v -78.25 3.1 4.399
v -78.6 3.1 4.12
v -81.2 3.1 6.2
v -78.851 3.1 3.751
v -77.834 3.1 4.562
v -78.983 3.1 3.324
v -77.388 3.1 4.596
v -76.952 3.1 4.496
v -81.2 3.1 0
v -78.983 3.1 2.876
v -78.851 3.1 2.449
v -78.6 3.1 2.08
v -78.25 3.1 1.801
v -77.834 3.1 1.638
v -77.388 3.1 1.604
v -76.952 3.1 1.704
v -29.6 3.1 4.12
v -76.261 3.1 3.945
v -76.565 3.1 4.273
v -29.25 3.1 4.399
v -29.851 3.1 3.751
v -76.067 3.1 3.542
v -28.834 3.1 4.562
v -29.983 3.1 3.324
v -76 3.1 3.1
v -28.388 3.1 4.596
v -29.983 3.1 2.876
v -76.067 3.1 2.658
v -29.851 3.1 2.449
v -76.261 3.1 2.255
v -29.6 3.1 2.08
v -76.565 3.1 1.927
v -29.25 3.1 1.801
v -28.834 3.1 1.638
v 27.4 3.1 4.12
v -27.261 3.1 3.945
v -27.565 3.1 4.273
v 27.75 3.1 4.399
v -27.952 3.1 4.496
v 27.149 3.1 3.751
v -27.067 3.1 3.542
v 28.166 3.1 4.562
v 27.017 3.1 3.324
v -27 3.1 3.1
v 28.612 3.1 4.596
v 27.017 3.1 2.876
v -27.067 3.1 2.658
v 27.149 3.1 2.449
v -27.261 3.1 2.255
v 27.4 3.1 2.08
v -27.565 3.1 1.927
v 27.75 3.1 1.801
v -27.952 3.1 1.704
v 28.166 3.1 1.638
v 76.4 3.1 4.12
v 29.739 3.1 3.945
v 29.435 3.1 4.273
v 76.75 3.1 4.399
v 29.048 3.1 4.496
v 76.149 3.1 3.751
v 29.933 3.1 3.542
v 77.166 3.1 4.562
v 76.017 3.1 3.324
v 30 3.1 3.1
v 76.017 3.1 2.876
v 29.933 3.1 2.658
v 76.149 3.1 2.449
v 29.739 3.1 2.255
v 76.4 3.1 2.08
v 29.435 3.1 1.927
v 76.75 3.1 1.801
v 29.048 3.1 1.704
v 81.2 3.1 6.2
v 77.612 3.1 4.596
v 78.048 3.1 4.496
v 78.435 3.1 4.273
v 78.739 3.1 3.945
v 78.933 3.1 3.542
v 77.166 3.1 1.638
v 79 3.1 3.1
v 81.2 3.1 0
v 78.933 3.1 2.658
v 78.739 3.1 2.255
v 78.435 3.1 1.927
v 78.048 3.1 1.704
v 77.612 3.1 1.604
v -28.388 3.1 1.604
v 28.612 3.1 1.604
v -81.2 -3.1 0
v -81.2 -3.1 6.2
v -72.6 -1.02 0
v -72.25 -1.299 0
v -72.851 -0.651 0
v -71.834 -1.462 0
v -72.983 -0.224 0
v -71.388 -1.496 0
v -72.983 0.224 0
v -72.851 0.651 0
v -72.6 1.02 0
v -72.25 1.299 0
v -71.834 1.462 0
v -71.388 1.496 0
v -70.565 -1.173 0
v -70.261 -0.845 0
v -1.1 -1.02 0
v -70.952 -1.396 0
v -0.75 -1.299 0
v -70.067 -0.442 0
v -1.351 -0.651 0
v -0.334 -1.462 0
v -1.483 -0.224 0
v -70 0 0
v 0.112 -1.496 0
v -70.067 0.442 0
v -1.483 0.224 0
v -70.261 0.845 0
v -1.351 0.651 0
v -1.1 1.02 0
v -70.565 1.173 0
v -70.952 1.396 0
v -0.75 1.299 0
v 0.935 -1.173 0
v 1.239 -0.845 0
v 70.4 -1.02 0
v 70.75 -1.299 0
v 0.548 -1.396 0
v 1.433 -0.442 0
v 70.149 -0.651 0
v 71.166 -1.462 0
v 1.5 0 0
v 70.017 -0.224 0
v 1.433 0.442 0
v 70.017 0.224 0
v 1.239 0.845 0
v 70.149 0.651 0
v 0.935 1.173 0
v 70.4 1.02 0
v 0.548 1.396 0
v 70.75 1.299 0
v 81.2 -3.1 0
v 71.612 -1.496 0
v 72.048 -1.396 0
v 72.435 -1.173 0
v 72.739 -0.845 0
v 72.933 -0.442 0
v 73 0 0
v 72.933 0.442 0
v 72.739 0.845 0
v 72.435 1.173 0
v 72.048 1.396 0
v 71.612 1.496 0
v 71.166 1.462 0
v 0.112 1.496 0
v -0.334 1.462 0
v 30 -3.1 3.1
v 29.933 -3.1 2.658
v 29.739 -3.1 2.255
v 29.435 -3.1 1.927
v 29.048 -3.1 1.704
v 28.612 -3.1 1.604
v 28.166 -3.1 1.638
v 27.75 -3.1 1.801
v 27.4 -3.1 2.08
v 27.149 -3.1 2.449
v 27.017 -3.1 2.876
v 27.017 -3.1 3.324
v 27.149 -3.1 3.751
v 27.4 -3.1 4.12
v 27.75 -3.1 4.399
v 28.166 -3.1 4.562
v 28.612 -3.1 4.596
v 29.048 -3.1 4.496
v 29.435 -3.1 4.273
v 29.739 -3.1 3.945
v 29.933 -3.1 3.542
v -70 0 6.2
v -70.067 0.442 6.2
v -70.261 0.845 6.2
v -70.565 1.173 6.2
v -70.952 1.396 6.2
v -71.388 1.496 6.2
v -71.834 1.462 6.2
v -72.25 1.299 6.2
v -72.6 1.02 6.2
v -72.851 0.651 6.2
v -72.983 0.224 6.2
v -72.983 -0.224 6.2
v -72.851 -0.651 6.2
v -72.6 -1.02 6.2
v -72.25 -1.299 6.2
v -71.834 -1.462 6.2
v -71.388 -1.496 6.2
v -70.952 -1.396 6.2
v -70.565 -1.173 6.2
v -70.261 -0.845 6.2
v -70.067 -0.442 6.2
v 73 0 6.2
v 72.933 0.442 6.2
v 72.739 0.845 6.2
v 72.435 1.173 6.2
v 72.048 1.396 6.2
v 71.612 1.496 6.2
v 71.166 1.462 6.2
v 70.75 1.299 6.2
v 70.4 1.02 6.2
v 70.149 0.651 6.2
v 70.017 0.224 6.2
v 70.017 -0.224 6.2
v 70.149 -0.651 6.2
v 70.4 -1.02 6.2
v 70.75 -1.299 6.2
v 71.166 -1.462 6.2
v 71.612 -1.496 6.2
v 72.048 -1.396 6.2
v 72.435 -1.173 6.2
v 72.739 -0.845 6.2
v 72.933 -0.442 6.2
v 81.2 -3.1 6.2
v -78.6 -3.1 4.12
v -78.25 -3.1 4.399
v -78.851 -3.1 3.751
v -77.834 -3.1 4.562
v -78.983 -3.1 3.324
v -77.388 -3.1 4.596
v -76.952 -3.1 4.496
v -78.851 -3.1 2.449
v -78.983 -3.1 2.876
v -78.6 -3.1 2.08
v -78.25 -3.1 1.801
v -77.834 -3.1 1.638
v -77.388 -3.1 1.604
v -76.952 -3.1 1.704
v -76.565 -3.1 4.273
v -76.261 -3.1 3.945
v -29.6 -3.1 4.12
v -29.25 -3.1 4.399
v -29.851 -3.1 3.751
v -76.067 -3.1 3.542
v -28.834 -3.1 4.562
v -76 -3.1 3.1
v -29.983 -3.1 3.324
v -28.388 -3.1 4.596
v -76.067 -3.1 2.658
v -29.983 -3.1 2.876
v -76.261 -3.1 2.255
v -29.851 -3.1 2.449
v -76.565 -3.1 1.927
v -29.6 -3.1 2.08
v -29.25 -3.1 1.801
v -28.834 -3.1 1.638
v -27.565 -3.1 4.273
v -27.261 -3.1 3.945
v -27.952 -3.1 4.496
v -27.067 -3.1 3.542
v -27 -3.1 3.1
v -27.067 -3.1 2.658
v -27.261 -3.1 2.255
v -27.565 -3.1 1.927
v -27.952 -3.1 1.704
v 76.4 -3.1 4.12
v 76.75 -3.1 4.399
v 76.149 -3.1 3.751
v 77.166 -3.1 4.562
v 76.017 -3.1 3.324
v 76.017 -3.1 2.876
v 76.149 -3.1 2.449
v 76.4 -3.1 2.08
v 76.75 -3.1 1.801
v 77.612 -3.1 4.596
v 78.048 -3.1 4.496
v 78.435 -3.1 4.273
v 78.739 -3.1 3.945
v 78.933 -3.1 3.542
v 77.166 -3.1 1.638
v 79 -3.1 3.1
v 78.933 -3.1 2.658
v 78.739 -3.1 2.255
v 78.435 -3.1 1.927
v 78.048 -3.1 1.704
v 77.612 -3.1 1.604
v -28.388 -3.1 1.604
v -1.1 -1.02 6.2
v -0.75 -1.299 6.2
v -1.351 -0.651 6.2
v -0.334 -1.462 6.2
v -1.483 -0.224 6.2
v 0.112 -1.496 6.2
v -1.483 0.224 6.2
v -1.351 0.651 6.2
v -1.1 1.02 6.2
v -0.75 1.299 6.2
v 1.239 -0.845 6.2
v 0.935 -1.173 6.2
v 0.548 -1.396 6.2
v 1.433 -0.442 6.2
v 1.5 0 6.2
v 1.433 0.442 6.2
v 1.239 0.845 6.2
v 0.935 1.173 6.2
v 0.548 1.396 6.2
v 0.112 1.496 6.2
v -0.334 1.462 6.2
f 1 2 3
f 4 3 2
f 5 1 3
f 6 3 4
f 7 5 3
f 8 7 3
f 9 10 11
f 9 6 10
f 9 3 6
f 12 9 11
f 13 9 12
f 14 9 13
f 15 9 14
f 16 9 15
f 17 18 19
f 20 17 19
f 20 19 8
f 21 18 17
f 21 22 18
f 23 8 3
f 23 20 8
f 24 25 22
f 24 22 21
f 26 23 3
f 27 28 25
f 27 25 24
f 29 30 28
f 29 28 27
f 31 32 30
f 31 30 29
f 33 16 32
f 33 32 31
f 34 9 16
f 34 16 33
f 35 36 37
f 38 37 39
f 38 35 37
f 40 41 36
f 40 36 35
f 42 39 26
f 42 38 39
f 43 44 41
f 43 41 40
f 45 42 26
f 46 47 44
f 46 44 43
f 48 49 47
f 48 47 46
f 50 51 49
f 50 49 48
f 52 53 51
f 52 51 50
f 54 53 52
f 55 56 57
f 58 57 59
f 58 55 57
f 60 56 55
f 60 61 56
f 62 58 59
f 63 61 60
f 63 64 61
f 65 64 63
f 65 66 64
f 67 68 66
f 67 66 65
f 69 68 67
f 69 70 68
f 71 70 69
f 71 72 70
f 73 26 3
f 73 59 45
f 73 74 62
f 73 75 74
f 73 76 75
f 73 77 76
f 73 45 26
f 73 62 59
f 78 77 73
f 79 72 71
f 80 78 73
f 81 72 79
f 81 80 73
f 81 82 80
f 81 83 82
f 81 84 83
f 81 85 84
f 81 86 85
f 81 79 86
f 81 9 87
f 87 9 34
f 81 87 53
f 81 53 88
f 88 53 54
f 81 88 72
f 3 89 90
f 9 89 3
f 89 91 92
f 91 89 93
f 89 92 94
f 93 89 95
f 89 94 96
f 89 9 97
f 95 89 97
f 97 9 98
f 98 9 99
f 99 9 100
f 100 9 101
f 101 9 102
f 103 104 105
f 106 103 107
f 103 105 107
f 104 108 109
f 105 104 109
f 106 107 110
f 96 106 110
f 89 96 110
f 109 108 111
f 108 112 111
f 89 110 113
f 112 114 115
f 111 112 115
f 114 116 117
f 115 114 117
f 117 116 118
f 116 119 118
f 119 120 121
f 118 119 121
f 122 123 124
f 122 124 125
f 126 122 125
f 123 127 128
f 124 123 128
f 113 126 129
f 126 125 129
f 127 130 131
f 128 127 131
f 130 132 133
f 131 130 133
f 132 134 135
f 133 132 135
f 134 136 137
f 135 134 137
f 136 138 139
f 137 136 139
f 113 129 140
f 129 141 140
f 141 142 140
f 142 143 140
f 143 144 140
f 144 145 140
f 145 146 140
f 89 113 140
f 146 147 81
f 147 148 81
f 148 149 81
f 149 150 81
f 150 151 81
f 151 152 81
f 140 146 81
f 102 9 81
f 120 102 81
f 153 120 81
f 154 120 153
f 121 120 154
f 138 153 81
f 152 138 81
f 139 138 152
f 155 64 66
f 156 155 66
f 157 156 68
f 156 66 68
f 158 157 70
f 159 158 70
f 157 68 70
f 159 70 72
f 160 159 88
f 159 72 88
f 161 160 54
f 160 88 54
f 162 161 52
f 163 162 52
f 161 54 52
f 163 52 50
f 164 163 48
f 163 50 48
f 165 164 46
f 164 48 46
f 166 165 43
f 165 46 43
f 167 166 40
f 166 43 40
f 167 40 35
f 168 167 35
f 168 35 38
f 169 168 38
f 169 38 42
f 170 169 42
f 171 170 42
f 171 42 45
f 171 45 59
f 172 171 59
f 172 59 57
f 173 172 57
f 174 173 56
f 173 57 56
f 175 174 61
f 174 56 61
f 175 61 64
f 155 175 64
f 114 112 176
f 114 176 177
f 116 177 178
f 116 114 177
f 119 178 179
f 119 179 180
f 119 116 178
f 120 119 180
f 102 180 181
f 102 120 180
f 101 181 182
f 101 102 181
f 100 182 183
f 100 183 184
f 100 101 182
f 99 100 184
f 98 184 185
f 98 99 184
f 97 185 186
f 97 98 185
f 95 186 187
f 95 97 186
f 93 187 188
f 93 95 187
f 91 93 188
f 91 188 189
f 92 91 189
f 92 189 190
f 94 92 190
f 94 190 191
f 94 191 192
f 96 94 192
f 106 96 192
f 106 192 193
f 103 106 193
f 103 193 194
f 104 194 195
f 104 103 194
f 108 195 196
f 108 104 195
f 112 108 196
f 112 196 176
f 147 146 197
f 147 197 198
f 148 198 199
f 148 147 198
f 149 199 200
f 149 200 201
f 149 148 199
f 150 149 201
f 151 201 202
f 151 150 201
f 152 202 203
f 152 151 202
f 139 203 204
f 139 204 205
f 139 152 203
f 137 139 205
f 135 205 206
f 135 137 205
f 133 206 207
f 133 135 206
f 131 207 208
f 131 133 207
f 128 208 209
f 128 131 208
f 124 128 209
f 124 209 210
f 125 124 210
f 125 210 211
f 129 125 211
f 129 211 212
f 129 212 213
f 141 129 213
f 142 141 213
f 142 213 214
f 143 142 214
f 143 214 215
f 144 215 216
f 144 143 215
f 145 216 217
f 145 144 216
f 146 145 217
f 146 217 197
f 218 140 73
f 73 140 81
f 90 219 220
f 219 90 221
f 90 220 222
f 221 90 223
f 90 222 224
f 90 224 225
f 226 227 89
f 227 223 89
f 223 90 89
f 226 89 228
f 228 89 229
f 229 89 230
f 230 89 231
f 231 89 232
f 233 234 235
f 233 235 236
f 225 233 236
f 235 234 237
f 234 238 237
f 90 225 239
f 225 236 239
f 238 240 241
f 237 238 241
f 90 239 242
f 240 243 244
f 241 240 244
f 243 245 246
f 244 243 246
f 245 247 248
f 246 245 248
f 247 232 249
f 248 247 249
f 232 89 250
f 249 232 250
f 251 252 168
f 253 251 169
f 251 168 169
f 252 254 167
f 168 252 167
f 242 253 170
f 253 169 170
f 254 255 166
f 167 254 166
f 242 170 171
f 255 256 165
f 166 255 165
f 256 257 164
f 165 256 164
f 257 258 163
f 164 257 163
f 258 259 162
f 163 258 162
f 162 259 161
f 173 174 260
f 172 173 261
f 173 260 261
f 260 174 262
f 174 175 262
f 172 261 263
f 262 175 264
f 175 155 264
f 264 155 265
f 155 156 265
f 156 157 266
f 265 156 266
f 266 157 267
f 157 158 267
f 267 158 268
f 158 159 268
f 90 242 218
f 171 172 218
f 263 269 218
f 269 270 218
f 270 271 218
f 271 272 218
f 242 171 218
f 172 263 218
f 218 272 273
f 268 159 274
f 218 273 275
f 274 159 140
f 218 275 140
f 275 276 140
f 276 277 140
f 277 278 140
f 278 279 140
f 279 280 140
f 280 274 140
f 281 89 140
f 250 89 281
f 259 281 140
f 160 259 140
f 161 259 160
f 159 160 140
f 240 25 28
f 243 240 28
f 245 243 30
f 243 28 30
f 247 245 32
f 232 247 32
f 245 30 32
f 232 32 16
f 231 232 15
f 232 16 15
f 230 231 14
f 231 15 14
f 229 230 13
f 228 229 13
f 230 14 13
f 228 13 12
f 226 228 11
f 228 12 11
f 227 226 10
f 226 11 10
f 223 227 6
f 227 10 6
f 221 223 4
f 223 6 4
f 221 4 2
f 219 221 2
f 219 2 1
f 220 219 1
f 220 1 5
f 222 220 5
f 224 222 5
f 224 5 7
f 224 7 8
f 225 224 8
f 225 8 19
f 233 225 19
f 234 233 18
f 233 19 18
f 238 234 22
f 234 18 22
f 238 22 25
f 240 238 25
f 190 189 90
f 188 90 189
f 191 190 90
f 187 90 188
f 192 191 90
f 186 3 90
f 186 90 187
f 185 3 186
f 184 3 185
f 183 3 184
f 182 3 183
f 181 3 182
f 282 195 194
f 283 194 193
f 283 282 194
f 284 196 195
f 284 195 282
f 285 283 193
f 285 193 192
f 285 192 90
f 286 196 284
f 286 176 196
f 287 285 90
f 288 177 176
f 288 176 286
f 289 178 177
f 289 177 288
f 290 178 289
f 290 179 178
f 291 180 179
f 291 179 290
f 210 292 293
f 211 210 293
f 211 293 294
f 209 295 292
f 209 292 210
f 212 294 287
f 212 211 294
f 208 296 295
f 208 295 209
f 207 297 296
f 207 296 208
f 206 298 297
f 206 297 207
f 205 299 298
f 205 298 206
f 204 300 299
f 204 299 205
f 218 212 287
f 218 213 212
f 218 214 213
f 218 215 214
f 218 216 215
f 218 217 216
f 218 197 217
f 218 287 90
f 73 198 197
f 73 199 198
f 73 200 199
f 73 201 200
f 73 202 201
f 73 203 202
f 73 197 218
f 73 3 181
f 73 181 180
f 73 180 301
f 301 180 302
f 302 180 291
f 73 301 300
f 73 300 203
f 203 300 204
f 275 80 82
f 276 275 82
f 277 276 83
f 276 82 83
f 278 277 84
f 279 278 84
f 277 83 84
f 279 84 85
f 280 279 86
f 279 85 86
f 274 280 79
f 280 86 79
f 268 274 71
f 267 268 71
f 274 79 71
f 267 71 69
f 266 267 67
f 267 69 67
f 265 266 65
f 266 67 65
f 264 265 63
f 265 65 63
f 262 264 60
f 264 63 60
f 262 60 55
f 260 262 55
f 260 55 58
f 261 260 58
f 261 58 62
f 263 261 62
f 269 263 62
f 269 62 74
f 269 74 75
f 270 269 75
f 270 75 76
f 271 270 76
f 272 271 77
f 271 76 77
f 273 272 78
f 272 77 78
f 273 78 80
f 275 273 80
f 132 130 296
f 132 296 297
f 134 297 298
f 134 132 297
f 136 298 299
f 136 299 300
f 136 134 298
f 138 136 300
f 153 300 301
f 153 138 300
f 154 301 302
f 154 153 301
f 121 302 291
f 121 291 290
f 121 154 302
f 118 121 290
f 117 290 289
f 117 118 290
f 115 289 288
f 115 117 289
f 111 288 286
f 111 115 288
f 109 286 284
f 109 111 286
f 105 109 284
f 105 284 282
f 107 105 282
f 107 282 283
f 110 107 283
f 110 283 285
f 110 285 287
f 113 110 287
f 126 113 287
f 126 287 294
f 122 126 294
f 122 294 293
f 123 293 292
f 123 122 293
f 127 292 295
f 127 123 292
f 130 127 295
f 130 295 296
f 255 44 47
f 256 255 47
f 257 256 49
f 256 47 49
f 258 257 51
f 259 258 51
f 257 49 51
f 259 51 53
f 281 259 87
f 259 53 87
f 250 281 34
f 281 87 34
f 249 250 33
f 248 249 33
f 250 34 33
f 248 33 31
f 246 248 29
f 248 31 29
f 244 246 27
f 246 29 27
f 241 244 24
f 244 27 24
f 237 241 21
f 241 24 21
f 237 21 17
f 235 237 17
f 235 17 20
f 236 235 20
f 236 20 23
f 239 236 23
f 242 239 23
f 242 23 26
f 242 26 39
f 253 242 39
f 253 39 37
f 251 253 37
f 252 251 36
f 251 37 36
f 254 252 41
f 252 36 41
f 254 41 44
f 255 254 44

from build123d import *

# Parameters (mm, degrees)
CROQUIS1_W              = 162.4
CROQUIS1_H              = 6.2
CROQUIS1_R              = 1.5
SALIENTE_EXTRUIR1_DEPTH = 6.2
CROQUIS2_R              = 1.5
CORTAR_EXTRUIR1_DEPTH   = 6.2


with BuildPart() as part:
    # Croquis1 → Saliente-Extruir1 (new body)
    with BuildSketch(Plane.XY):
        Rectangle(CROQUIS1_W, CROQUIS1_H)
        with Locations((-71.5, 0)):
            Circle(CROQUIS1_R, mode=Mode.SUBTRACT)
        Circle(CROQUIS1_R, mode=Mode.SUBTRACT)
        with Locations((71.5, 0)):
            Circle(CROQUIS1_R, mode=Mode.SUBTRACT)
    extrude(amount=SALIENTE_EXTRUIR1_DEPTH)

    # Croquis2 → Cortar-Extruir1 (cut)
    with BuildSketch(Plane(origin=(0, 3.1, 0), x_dir=(1, 0, 0), z_dir=(0, 1, 0))):
        with Locations((-77.5, -3.1)):
            Circle(CROQUIS2_R)
        with Locations((-28.5, -3.1)):
            Circle(CROQUIS2_R)
        with Locations((28.5, -3.1)):
            Circle(CROQUIS2_R)
        with Locations((77.5, -3.1)):
            Circle(CROQUIS2_R)
    extrude(amount=-CORTAR_EXTRUIR1_DEPTH, mode=Mode.SUBTRACT)


solid = part.part
